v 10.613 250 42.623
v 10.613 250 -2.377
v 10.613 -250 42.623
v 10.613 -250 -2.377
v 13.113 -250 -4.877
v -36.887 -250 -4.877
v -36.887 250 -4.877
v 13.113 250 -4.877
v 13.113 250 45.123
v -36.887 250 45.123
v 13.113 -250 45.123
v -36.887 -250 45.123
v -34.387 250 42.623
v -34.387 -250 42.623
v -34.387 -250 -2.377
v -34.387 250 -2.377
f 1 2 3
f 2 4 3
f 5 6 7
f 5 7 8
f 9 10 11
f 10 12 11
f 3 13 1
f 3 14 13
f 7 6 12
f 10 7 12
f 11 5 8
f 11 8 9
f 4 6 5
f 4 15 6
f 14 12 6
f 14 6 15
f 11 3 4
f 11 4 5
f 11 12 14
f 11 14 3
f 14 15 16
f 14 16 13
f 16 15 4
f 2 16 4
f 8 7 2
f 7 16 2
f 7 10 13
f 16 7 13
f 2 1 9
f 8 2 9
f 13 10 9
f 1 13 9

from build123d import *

# Parameters (mm, degrees)
F0_W     = 50
F0_H     = 50
F0_W_2   = 45
F0_H_2   = 45
F1_DEPTH = 250


with BuildPart() as f1:
    # F0 (on Front) → F1 (new body, symmetric)
    with BuildSketch(Plane.XZ):
        with Locations((-11.886792, 20.122862)):
            Rectangle(F0_W, F0_H)
        with Locations((-11.886792, 20.122862)):
            Rectangle(F0_W_2, F0_H_2, mode=Mode.SUBTRACT)
    extrude(amount=F1_DEPTH, both=True)


solid = f1.part
